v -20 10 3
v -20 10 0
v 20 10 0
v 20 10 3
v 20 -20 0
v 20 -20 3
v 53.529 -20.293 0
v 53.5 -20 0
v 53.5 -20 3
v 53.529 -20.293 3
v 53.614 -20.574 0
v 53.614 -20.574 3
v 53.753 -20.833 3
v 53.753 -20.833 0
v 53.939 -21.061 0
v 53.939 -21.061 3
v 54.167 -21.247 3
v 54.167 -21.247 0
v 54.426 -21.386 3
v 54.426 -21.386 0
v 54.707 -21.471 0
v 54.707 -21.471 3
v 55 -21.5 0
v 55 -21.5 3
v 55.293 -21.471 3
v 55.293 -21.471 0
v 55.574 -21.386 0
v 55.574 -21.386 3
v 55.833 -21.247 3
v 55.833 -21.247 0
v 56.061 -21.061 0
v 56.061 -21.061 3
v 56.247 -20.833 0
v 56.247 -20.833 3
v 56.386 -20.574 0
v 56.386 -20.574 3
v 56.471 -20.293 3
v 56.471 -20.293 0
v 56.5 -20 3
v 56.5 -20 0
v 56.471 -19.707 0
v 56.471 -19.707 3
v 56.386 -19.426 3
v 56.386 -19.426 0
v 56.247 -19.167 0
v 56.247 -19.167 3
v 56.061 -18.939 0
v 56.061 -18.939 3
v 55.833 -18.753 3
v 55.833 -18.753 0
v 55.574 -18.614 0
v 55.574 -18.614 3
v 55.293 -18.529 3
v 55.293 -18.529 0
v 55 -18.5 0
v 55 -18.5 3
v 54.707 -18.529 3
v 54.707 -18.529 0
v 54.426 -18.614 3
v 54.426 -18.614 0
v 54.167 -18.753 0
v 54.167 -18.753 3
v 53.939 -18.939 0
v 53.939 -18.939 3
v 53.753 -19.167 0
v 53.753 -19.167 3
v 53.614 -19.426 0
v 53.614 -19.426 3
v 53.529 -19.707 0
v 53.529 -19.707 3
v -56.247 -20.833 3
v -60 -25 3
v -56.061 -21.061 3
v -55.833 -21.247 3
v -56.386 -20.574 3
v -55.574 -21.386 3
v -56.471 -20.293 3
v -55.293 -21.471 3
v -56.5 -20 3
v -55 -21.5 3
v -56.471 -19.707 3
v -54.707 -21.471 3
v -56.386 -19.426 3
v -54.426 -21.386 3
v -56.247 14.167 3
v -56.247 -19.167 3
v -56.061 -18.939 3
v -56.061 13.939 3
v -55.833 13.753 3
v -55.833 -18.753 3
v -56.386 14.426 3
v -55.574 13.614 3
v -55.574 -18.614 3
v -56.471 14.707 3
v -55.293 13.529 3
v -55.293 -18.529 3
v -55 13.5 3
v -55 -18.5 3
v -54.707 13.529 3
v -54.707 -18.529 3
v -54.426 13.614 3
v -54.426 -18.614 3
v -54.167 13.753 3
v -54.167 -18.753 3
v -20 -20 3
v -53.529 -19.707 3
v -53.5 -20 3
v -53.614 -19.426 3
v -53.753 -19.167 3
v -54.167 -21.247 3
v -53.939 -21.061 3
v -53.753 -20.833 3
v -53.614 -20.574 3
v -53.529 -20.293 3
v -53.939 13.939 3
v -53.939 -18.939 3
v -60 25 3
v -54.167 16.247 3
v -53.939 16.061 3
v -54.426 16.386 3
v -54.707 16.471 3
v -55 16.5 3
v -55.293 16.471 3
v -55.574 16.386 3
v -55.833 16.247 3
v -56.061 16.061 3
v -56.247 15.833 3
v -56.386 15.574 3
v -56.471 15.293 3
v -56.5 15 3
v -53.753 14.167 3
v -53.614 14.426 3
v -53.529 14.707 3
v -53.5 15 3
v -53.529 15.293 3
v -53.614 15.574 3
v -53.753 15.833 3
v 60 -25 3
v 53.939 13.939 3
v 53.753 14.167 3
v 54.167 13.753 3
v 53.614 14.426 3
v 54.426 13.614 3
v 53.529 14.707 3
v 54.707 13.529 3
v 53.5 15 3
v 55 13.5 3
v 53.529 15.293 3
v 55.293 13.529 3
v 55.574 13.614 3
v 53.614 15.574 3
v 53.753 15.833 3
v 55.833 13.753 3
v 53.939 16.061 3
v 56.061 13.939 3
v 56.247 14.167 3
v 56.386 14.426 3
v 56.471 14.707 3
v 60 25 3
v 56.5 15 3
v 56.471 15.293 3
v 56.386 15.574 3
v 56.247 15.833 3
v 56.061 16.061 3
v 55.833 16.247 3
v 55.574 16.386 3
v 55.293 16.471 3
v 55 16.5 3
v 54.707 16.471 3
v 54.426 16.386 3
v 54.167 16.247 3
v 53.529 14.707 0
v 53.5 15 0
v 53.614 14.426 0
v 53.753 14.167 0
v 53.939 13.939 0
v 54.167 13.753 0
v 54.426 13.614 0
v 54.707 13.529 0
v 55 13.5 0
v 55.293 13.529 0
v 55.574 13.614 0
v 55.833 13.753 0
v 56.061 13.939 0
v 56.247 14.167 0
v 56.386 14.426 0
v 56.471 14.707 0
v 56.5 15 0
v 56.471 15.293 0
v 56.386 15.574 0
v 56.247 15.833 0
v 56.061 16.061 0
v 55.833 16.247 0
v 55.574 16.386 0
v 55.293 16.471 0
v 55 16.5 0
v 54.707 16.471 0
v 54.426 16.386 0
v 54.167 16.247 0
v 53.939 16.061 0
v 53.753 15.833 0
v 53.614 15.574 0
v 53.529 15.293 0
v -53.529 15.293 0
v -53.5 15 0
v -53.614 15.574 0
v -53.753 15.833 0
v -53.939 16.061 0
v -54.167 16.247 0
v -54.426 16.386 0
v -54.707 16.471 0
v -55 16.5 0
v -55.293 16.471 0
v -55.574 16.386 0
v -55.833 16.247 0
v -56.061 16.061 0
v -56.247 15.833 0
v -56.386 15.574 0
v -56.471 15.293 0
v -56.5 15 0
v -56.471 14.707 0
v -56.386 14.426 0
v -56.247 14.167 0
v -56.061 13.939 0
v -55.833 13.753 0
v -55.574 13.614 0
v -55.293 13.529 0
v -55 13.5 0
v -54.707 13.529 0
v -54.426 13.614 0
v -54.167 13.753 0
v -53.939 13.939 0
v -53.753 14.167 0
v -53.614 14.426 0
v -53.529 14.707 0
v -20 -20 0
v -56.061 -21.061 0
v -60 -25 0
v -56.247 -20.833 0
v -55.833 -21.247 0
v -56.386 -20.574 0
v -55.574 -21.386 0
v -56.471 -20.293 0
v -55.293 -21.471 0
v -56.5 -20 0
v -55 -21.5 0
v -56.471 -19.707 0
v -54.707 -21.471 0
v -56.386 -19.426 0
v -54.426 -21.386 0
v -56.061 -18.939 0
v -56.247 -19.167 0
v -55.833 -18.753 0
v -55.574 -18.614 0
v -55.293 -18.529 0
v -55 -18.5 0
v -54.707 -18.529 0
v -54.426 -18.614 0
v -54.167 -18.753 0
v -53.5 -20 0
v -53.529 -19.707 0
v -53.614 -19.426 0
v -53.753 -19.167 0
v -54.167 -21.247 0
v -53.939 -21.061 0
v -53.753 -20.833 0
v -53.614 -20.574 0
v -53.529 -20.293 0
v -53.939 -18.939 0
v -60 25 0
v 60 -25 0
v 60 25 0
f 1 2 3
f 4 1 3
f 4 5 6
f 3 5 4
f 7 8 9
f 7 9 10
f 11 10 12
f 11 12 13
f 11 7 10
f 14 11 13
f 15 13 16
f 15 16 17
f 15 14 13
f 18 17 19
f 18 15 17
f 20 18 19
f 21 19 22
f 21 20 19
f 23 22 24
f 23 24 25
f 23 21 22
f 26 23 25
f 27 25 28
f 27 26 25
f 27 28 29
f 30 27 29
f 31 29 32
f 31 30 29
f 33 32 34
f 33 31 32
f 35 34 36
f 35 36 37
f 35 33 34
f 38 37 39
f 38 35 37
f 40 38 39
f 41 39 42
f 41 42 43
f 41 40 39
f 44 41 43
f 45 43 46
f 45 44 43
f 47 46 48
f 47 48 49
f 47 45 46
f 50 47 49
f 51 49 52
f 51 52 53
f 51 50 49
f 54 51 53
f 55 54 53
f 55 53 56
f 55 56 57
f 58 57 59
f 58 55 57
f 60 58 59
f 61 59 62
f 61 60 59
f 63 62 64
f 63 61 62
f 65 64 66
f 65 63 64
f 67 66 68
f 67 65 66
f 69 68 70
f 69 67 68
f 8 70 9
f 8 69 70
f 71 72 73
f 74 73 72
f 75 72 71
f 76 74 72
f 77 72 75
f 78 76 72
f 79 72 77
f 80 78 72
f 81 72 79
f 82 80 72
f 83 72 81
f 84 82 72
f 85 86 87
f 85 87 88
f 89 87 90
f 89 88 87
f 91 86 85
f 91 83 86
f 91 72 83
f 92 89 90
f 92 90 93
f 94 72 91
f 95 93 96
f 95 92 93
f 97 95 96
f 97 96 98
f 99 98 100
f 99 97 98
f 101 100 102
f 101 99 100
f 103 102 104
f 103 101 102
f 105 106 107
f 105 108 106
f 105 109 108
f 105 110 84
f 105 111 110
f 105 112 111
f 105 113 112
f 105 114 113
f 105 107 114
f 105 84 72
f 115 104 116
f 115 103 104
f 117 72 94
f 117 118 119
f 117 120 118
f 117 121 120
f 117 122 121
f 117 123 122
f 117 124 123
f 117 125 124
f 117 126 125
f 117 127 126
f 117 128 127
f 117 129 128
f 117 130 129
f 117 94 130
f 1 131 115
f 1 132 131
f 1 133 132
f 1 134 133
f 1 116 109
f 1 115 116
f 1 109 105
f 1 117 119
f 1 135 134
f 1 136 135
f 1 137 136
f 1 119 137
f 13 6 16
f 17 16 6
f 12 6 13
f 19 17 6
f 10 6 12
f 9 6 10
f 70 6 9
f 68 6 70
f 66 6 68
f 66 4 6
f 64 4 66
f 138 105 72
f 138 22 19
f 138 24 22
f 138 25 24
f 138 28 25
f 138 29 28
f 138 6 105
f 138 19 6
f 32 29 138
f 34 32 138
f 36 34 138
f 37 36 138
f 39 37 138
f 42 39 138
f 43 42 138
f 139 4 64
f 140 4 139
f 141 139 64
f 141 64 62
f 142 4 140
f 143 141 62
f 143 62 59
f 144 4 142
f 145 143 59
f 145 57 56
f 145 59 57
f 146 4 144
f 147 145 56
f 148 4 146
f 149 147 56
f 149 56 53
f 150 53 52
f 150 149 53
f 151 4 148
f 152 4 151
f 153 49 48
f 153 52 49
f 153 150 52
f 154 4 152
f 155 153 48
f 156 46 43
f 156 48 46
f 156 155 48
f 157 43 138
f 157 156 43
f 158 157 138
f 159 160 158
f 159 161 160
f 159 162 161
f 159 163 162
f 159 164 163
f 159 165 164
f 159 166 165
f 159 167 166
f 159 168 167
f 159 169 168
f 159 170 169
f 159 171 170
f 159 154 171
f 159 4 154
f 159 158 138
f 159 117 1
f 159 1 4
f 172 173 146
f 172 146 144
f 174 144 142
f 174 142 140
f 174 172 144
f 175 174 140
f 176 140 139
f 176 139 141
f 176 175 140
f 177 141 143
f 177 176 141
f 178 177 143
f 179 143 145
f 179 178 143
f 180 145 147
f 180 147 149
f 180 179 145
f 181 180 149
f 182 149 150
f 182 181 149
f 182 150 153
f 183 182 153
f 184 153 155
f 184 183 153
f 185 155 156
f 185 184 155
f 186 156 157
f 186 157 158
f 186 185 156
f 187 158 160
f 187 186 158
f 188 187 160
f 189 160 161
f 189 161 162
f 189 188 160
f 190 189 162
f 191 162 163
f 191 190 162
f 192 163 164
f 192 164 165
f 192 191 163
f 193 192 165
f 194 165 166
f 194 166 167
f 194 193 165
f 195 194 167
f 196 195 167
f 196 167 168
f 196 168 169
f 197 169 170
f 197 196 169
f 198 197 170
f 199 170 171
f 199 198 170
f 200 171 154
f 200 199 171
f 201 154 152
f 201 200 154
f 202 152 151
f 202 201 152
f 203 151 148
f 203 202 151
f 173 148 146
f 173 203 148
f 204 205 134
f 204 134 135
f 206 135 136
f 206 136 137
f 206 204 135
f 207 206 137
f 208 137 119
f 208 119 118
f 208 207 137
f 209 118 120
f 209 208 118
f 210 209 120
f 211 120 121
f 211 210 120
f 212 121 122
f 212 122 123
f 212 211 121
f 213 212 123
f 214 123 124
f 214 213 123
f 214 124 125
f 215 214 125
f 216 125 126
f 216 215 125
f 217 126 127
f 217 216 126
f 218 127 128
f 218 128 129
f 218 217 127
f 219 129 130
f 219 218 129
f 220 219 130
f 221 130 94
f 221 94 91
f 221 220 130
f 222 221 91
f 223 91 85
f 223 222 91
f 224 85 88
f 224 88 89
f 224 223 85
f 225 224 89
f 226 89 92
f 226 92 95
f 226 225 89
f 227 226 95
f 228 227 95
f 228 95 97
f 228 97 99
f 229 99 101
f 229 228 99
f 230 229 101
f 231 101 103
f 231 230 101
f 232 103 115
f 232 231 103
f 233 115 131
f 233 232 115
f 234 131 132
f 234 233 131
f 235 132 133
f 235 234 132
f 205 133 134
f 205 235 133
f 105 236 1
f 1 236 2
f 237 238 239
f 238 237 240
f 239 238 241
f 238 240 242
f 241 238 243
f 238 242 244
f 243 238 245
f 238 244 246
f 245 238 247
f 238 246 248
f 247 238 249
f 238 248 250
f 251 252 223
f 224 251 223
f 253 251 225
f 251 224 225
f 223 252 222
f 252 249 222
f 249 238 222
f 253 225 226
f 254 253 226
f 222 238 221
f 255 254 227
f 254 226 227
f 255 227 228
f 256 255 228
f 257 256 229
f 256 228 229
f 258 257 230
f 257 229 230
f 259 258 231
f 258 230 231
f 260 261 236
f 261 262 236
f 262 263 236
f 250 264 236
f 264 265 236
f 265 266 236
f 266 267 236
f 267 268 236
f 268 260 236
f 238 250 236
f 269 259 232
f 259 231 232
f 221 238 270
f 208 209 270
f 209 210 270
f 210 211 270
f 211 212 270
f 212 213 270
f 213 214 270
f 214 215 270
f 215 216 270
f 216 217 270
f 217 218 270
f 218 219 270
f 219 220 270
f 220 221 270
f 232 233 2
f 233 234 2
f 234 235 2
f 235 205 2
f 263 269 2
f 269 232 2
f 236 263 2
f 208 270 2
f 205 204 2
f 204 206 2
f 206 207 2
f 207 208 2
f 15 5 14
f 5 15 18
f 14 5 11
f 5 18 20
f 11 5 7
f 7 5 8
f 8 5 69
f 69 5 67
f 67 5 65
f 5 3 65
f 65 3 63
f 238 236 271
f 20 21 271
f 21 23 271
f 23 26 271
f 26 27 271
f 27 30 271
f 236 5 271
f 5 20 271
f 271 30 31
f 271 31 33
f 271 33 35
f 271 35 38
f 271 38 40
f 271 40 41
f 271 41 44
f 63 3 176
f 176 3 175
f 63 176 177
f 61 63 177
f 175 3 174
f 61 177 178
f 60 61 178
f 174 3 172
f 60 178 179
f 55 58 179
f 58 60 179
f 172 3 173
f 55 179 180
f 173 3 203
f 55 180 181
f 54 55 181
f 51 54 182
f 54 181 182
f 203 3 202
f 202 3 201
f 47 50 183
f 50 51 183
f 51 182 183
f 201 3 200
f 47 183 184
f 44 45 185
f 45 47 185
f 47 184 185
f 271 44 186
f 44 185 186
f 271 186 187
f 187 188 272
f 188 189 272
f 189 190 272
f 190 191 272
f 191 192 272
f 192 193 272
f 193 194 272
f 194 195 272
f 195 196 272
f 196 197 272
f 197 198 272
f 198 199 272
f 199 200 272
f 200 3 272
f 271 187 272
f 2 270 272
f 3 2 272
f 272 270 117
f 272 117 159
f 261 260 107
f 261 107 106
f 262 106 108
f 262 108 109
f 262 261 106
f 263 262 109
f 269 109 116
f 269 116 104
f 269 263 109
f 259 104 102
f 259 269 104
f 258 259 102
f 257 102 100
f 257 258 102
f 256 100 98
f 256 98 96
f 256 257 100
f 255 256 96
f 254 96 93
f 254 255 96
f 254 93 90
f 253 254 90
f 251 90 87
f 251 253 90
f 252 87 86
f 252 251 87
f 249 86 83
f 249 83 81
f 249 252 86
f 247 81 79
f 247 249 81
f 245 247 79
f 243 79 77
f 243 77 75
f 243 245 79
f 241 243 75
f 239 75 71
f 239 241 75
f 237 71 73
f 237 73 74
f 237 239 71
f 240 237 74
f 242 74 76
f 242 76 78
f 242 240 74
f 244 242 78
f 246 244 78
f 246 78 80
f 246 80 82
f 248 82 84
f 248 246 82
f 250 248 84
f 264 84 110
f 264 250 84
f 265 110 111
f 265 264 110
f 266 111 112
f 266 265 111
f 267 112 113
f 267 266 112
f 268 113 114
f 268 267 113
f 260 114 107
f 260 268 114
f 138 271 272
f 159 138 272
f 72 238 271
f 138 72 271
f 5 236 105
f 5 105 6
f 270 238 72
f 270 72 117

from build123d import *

# Parameters (mm, degrees)
ESQUISSE1_W        = 120
ESQUISSE1_H        = 50
ESQUISSE1_R        = 1.5
ESQUISSE1_W_2      = 40
ESQUISSE1_H_2      = 30
BOSS_EXTRU_1_DEPTH = 3


with BuildPart() as part:
    # Esquisse1 → Boss.-Extru.1 (new body)
    with BuildSketch(Plane.XY):
        Rectangle(ESQUISSE1_W, ESQUISSE1_H)
        with Locations((-55, 15)):
            Circle(ESQUISSE1_R, mode=Mode.SUBTRACT)
        with Locations((-55, -20)):
            Circle(ESQUISSE1_R, mode=Mode.SUBTRACT)
        with Locations(Location((55, -20, 0), (0, 0, 180))):
            Circle(ESQUISSE1_R, mode=Mode.SUBTRACT)
        with Locations(Location((55, 15, 0), (0, 0, 180))):
            Circle(ESQUISSE1_R, mode=Mode.SUBTRACT)
        with Locations((0, -5)):
            Rectangle(ESQUISSE1_W_2, ESQUISSE1_H_2, mode=Mode.SUBTRACT)
    extrude(amount=BOSS_EXTRU_1_DEPTH)


solid = part.part
